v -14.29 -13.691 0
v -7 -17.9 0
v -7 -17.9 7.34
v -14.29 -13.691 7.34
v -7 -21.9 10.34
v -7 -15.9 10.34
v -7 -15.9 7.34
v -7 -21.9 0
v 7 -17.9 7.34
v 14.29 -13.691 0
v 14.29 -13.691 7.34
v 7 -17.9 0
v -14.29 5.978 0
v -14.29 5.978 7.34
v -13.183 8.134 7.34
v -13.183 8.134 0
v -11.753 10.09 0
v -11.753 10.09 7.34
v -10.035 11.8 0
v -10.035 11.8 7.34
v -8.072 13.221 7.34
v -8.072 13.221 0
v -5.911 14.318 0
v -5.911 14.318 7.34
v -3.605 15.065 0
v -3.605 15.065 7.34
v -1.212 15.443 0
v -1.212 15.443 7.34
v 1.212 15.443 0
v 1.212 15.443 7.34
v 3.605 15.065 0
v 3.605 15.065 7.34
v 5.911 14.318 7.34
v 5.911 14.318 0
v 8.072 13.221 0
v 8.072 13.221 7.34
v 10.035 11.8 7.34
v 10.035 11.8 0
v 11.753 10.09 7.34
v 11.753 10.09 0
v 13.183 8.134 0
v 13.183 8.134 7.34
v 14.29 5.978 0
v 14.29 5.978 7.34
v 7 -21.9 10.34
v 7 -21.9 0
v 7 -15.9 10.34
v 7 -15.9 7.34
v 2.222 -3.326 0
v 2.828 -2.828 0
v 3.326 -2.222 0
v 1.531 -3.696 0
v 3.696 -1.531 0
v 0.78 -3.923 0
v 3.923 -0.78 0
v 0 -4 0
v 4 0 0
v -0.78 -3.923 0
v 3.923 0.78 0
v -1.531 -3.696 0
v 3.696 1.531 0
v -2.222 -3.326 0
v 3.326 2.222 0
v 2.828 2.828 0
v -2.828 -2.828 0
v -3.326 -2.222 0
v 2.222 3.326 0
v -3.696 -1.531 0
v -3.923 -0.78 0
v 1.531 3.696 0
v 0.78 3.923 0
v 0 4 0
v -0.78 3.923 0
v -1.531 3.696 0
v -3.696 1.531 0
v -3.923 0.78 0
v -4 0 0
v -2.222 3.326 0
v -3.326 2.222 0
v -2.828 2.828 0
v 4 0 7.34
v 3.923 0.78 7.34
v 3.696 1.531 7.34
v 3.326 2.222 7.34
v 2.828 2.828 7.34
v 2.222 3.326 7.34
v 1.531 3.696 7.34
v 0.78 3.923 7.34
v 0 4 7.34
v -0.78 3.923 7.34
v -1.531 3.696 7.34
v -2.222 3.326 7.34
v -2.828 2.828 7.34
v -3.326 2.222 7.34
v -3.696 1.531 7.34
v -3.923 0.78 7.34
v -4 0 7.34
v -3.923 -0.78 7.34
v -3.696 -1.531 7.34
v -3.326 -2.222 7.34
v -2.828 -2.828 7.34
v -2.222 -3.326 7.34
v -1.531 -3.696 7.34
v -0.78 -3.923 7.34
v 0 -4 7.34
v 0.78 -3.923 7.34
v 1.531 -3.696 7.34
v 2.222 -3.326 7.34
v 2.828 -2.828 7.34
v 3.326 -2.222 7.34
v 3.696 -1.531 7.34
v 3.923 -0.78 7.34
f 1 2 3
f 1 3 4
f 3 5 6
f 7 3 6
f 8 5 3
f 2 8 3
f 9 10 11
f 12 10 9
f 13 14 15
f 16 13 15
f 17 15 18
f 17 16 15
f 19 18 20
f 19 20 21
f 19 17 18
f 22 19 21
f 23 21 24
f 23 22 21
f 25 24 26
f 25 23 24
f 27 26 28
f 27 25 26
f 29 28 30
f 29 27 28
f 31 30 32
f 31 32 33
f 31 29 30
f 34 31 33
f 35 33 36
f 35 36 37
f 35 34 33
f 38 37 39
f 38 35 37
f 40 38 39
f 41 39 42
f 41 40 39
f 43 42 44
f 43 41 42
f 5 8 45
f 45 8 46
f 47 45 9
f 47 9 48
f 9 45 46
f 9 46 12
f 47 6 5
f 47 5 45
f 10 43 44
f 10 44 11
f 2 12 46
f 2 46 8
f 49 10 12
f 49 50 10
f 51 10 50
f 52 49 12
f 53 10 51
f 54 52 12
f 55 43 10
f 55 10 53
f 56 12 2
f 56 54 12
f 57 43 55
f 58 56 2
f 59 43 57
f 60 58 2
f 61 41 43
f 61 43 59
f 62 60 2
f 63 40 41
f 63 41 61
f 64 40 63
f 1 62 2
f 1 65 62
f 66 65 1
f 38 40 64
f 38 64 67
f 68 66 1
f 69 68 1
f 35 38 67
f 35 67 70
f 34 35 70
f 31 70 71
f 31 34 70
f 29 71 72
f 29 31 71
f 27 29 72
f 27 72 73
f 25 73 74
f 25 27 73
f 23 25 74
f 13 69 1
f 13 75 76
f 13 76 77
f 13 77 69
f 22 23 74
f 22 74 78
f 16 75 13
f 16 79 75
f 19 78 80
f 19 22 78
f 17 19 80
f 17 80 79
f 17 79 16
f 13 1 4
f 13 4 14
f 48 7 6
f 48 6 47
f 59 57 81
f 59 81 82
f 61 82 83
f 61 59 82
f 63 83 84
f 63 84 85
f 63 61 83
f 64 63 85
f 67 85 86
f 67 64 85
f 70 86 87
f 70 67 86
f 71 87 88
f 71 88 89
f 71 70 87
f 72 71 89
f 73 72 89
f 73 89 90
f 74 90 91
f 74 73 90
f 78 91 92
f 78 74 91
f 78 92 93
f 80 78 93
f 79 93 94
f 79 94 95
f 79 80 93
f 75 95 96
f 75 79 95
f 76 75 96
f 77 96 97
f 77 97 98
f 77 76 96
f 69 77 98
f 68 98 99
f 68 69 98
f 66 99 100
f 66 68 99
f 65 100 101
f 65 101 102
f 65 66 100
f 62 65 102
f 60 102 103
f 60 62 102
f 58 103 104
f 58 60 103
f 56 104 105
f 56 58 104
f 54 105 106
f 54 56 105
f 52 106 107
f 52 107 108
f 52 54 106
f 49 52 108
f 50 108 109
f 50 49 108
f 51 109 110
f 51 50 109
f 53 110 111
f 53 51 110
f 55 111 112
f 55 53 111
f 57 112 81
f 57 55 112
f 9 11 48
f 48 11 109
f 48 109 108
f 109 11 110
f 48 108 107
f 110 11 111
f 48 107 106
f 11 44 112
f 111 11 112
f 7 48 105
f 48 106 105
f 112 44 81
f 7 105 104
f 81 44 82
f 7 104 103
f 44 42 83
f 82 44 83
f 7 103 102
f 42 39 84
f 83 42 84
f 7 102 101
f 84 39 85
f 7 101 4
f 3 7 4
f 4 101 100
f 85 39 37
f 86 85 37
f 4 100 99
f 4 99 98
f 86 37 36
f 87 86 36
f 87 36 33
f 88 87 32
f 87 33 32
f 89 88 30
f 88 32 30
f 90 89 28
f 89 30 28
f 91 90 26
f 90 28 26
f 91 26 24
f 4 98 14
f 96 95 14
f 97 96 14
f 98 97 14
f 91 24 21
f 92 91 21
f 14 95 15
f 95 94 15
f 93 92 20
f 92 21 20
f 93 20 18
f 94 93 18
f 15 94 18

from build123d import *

# Parameters (mm, degrees)
ESQUISSE1_R        = 4
BOSS_EXTRU_1_DEPTH = 7.34
ESQUISSE2_W        = 14
ESQUISSE2_H        = 6
BOSS_EXTRU_2_DEPTH = 3


with BuildPart() as part:
    # Esquisse1 → Boss.-Extru.1 (new body)
    with BuildSketch(Plane.XY):
        with BuildLine():
            Line((-14.29, -13.691116538), (-14.29, 5.977959518))
            ThreePointArc((-14.29, 5.977959518), (0, 15.49), (14.29, 5.977959518))
            Line((14.29, 5.977959518), (14.29, -13.691116538))
            Line((14.29, -13.691116538), (7, -17.9))
            Line((7, -17.9), (7, -21.9))
            Line((7, -21.9), (-7, -21.9))
            Line((-7, -21.9), (-7, -17.9))
            Line((-7, -17.9), (-14.29, -13.691116538))
        make_face()
        Circle(ESQUISSE1_R, mode=Mode.SUBTRACT)
    extrude(amount=BOSS_EXTRU_1_DEPTH)

    # Esquisse2 → Boss.-Extru.2 (add)
    with BuildSketch(Plane.XY.offset(7.34)):
        with Locations((0, -18.9)):
            Rectangle(ESQUISSE2_W, ESQUISSE2_H)
    extrude(amount=BOSS_EXTRU_2_DEPTH)


solid = part.part
